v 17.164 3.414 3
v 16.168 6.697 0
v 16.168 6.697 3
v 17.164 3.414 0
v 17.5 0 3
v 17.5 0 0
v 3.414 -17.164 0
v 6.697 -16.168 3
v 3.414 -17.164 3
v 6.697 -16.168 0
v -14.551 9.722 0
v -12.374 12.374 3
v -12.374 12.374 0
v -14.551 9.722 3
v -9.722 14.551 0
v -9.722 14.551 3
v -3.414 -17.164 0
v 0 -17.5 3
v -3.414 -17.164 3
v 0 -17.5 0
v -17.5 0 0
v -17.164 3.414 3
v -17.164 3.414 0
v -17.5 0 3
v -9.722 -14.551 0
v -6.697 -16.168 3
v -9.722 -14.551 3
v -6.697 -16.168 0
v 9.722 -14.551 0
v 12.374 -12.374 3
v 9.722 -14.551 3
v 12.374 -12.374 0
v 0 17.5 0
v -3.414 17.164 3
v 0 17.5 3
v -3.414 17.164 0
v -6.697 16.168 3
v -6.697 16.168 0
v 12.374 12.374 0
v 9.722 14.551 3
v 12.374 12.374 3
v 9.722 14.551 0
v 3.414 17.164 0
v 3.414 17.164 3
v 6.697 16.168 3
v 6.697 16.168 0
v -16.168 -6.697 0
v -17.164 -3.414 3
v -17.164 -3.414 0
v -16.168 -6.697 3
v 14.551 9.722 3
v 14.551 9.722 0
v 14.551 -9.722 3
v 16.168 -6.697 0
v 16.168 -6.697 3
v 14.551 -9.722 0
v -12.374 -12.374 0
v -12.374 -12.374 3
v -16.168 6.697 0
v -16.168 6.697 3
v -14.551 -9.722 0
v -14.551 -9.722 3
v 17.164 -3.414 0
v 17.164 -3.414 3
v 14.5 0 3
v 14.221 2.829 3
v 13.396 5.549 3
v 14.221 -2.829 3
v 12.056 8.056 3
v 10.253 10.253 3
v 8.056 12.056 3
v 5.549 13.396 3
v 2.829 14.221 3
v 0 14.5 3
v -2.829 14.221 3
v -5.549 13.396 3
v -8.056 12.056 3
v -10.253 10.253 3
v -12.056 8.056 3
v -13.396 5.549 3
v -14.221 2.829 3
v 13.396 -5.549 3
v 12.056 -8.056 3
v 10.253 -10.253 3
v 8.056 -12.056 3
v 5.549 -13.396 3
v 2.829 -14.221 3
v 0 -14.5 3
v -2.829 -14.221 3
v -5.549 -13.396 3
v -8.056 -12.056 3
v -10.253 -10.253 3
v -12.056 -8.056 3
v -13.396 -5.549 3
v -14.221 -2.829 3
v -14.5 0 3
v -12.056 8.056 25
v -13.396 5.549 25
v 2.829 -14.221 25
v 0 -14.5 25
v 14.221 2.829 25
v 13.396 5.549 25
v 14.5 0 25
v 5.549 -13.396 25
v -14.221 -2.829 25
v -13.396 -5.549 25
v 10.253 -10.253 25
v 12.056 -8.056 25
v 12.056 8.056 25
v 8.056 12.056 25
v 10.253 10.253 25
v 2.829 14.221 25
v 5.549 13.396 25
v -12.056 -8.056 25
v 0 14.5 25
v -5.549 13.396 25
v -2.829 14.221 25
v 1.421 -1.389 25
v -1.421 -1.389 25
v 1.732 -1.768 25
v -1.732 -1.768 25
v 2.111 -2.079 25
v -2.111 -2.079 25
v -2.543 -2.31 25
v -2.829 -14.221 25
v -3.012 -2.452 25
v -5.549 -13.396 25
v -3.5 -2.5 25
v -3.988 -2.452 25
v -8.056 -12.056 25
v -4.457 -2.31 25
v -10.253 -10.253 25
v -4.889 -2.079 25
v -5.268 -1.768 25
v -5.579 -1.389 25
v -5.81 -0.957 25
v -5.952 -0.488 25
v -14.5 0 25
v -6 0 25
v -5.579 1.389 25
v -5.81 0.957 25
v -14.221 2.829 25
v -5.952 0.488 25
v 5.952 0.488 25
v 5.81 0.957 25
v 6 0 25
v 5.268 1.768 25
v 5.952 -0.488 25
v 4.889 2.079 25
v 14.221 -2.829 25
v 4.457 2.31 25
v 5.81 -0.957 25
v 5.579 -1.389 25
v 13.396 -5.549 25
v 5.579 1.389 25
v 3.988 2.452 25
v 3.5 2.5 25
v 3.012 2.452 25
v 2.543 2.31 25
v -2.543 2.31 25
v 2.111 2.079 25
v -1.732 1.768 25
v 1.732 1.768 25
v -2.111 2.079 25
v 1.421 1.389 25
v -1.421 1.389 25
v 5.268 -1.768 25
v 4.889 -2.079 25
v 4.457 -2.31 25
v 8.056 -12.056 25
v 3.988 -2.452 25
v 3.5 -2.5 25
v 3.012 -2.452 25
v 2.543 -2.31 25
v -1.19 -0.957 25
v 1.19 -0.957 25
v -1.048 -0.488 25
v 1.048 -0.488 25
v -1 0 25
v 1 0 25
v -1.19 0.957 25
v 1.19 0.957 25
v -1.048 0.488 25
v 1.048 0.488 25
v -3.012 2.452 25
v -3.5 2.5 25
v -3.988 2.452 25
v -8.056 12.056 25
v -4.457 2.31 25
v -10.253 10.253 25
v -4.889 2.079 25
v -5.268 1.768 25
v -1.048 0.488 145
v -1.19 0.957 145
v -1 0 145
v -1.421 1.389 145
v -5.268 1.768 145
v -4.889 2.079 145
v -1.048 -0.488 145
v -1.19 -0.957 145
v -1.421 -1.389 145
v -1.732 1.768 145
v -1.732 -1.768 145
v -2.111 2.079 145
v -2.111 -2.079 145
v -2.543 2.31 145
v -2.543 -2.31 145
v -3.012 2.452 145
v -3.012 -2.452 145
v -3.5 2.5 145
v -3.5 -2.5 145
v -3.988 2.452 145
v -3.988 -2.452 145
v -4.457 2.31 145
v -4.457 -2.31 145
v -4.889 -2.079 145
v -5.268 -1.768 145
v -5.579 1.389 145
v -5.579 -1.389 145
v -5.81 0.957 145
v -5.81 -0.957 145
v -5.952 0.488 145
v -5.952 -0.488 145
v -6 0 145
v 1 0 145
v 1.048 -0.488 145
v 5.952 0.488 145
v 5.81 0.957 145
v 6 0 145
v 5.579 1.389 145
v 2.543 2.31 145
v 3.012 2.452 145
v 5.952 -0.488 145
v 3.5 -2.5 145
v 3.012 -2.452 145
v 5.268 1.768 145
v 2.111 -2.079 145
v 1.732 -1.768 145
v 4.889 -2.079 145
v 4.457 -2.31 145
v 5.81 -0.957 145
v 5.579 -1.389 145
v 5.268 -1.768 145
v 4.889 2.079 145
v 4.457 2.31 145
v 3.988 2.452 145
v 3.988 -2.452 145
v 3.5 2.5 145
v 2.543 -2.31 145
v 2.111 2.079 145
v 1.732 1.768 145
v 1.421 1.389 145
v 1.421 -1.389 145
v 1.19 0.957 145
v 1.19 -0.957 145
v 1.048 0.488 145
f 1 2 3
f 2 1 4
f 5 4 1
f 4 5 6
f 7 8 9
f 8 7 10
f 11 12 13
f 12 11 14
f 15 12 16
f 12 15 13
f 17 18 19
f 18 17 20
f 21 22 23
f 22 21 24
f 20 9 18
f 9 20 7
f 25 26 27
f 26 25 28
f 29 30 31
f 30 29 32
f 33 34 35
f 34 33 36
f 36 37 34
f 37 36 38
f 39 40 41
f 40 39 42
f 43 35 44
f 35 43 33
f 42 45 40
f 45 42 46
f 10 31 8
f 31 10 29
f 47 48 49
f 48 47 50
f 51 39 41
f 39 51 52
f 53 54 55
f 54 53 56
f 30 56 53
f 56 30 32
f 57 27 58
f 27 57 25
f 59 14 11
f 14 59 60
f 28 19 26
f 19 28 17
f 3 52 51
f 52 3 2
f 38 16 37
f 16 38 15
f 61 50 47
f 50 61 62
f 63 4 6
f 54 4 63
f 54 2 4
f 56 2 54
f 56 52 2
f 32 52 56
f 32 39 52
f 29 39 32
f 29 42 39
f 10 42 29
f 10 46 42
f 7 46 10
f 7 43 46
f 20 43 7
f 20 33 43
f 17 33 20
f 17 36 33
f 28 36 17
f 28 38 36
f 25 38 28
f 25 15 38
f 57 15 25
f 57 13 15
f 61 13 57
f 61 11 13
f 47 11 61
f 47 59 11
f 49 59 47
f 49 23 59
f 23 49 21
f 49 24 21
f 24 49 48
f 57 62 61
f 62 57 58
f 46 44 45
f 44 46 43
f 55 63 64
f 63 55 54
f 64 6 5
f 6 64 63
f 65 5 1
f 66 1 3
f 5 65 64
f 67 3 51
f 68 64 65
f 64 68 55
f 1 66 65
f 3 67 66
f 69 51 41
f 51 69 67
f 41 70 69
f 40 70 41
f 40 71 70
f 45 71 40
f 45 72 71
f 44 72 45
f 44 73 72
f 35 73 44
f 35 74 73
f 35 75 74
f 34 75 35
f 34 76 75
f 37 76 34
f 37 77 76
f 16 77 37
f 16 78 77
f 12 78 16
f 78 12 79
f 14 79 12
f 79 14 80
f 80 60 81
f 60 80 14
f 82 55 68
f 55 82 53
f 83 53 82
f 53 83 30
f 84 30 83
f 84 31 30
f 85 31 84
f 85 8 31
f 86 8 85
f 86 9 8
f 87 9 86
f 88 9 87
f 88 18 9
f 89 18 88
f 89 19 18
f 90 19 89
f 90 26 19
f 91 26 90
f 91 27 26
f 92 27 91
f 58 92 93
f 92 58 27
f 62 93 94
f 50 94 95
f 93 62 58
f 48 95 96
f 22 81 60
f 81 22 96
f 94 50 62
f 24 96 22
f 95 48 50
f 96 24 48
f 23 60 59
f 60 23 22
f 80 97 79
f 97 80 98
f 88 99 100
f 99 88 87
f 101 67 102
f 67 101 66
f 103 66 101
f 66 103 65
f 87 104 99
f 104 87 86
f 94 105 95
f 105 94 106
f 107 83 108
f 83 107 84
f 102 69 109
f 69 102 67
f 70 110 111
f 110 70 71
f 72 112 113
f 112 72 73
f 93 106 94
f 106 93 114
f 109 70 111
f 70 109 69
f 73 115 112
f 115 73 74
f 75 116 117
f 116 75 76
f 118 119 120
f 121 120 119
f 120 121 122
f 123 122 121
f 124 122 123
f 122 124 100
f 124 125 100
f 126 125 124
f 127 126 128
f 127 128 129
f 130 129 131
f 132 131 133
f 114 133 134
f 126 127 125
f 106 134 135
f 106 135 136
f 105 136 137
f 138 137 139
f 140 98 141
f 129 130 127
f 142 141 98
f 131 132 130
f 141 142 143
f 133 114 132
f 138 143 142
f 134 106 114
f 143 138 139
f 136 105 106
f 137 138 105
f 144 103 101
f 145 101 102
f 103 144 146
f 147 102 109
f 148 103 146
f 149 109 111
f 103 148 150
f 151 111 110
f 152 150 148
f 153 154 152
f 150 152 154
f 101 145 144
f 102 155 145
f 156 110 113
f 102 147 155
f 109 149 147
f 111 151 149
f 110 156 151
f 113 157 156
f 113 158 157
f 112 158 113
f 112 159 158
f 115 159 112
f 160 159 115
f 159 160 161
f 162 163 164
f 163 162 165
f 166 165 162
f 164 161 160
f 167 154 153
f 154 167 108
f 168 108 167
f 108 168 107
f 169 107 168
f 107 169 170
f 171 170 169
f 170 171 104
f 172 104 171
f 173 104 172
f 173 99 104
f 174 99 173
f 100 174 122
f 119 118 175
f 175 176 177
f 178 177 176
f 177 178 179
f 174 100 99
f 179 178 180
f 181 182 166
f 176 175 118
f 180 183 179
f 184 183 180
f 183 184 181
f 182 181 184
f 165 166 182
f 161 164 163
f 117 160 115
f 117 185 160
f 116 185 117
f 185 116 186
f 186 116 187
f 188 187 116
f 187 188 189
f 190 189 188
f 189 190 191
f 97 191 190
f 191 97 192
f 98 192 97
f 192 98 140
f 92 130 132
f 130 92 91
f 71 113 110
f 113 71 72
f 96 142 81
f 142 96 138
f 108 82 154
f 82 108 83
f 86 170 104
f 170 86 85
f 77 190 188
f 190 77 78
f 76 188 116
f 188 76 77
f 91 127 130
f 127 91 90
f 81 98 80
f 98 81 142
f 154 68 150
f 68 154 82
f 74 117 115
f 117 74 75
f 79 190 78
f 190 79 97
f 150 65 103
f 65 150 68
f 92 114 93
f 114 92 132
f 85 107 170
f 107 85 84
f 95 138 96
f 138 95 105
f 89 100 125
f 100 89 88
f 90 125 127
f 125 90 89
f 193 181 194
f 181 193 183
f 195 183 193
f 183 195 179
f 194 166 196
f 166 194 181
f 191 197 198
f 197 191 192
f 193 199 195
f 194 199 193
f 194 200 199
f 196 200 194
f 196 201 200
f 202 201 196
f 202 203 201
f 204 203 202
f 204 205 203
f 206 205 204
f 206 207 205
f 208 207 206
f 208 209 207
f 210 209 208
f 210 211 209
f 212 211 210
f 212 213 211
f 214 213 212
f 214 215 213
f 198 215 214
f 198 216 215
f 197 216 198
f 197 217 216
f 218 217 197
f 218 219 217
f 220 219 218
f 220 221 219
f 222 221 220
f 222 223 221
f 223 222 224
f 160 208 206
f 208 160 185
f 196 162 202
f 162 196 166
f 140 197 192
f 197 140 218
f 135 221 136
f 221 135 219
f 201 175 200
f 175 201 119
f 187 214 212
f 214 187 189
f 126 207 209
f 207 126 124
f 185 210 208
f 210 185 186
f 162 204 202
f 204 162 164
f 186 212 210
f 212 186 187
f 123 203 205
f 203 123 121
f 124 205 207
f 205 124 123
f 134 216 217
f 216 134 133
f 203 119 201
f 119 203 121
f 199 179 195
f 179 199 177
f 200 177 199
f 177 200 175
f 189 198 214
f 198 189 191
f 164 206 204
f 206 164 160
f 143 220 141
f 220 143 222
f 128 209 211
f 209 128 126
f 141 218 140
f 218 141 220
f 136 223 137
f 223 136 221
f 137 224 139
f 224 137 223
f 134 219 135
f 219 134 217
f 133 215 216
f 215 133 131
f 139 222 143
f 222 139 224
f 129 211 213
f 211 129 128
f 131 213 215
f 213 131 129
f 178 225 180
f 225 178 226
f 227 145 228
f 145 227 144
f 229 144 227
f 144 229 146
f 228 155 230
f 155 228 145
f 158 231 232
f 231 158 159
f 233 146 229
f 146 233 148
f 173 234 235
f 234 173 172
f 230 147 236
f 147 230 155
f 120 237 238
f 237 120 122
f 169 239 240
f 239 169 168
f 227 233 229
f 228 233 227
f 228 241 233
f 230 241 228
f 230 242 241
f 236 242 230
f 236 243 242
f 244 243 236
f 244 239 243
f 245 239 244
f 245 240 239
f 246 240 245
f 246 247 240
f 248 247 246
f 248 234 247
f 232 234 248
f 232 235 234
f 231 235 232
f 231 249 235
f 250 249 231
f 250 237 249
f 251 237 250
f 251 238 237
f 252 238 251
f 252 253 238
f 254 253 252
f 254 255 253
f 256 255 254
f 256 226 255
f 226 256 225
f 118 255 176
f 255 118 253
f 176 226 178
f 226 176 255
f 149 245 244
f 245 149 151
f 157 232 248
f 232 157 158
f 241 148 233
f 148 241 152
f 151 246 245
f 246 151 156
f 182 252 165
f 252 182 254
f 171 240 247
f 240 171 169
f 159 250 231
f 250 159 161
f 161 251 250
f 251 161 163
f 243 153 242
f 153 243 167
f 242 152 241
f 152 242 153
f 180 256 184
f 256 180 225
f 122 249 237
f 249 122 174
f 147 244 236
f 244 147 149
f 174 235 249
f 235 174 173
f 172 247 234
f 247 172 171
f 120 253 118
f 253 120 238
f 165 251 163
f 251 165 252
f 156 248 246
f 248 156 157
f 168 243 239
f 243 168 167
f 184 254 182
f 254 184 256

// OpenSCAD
//
// ============================================================================
// SteamMachine UM790
// Project Phoenix
//
// Archivo  : usb_front.scad
// Versión  : 2.0
// Fecha    : 2026-08-03
//
// Volumen mecánico de referencia del conector USB empotrable frontal
// para el ensamblaje virtual v1.
//
// v2.0 — Sustituye el diseño anterior (dos unidades independientes)
// por una única unidad de DOBLE puerto USB-A en un solo cuerpo
// roscado, conectada al HUB mediante dos cables flexibles con
// conector USB-A macho (componente real localizado por el usuario).
// Un solo orificio en el panel en vez de dos.
//
// NO ES UNA PIEZA IMPRIMIBLE.
//
// Sistema de coordenadas LOCAL de este módulo:
//   Origen (0,0,0) = centro de la brida, cara frontal (apoya sobre
//                     el panel).
//   +Z = hacia el interior del chasis (cuerpo rígido roscado, luego
//        cable flexible). Se usa +Z, no +Y, para que los cilindros
//        se extruyan de forma natural; el ensamblaje
//        (virtual_assembly_v1.scad) rota este módulo 90º sobre X al
//        montarlo en el panel frontal.
//
// IMPORTANTE — el cable (usbFrontCableKeepout) es FLEXIBLE: se
// modela como volumen de seguridad recto solo a efectos de
// visualización y de una comprobación orientativa, pero en el
// montaje real puede curvarse para esquivar otros componentes. Una
// intersección con el cable es un aviso a revisar, no una colisión
// mecánica dura como con el cuerpo rígido.
//
// ============================================================================

include <../../../00_parametros.scad>;

$fn = 32;

part_version = "2.0";


//=============================================================================
// COLORES
//=============================================================================

usbFrontFlangeColor = [0.75,0.75,0.75,1.0];
usbFrontBodyColor   = [0.15,0.15,0.15,1.0];
usbFrontCableColor  = [1.00,0.65,0.00,0.15];


//=============================================================================
// BRIDA (apoyada en la cara exterior del panel)
//=============================================================================

module usbFrontFlange(flangeThickness = 3)
{

    color(usbFrontFlangeColor)

        cylinder(
            d = usb_front_flange_diameter,
            h = flangeThickness
        );

}


//=============================================================================
// CUERPO RÍGIDO (rosca + fuelle corrugado)
//=============================================================================

module usbFrontRigidBody(flangeThickness = 3)
{

    color(usbFrontBodyColor)

    translate([0,0,flangeThickness])

        cylinder(
            d = usb_front_hole_diameter,
            h = usb_front_body_length
        );

}


//=============================================================================
// CUERPO MECÁNICO (para comprobación de colisiones "duras")
//=============================================================================

module usbFrontBody()
{

    union()
    {
        usbFrontFlange();
        usbFrontRigidBody();
    }

}


//=============================================================================
// CABLE FLEXIBLE HACIA EL HUB (volumen de seguridad, NO rígido)
//
// Se representan los dos cables como dos cilindros finos, rectos a
// efectos de este ensamblaje de referencia. En el montaje real
// pueden curvarse; cualquier aviso de intersección aquí es orientativo.
//=============================================================================

module usbFrontCableKeepout(flangeThickness = 3)
{

    color(usbFrontCableColor)

    for(ix=[-1,1])

        translate([
            ix*usb_front_cable_diameter*0.7,
            0,
            flangeThickness + usb_front_body_length
        ])

            cylinder(
                d = usb_front_cable_diameter,
                h = usb_front_cable_length
            );

}


//=============================================================================
// CONJUNTO COMPLETO (visualización)
//=============================================================================

module usbFront()
{

    usbFrontBody();

    usbFrontCableKeepout();

}


//=============================================================================
// PREVIEW
//=============================================================================

usbFront();
